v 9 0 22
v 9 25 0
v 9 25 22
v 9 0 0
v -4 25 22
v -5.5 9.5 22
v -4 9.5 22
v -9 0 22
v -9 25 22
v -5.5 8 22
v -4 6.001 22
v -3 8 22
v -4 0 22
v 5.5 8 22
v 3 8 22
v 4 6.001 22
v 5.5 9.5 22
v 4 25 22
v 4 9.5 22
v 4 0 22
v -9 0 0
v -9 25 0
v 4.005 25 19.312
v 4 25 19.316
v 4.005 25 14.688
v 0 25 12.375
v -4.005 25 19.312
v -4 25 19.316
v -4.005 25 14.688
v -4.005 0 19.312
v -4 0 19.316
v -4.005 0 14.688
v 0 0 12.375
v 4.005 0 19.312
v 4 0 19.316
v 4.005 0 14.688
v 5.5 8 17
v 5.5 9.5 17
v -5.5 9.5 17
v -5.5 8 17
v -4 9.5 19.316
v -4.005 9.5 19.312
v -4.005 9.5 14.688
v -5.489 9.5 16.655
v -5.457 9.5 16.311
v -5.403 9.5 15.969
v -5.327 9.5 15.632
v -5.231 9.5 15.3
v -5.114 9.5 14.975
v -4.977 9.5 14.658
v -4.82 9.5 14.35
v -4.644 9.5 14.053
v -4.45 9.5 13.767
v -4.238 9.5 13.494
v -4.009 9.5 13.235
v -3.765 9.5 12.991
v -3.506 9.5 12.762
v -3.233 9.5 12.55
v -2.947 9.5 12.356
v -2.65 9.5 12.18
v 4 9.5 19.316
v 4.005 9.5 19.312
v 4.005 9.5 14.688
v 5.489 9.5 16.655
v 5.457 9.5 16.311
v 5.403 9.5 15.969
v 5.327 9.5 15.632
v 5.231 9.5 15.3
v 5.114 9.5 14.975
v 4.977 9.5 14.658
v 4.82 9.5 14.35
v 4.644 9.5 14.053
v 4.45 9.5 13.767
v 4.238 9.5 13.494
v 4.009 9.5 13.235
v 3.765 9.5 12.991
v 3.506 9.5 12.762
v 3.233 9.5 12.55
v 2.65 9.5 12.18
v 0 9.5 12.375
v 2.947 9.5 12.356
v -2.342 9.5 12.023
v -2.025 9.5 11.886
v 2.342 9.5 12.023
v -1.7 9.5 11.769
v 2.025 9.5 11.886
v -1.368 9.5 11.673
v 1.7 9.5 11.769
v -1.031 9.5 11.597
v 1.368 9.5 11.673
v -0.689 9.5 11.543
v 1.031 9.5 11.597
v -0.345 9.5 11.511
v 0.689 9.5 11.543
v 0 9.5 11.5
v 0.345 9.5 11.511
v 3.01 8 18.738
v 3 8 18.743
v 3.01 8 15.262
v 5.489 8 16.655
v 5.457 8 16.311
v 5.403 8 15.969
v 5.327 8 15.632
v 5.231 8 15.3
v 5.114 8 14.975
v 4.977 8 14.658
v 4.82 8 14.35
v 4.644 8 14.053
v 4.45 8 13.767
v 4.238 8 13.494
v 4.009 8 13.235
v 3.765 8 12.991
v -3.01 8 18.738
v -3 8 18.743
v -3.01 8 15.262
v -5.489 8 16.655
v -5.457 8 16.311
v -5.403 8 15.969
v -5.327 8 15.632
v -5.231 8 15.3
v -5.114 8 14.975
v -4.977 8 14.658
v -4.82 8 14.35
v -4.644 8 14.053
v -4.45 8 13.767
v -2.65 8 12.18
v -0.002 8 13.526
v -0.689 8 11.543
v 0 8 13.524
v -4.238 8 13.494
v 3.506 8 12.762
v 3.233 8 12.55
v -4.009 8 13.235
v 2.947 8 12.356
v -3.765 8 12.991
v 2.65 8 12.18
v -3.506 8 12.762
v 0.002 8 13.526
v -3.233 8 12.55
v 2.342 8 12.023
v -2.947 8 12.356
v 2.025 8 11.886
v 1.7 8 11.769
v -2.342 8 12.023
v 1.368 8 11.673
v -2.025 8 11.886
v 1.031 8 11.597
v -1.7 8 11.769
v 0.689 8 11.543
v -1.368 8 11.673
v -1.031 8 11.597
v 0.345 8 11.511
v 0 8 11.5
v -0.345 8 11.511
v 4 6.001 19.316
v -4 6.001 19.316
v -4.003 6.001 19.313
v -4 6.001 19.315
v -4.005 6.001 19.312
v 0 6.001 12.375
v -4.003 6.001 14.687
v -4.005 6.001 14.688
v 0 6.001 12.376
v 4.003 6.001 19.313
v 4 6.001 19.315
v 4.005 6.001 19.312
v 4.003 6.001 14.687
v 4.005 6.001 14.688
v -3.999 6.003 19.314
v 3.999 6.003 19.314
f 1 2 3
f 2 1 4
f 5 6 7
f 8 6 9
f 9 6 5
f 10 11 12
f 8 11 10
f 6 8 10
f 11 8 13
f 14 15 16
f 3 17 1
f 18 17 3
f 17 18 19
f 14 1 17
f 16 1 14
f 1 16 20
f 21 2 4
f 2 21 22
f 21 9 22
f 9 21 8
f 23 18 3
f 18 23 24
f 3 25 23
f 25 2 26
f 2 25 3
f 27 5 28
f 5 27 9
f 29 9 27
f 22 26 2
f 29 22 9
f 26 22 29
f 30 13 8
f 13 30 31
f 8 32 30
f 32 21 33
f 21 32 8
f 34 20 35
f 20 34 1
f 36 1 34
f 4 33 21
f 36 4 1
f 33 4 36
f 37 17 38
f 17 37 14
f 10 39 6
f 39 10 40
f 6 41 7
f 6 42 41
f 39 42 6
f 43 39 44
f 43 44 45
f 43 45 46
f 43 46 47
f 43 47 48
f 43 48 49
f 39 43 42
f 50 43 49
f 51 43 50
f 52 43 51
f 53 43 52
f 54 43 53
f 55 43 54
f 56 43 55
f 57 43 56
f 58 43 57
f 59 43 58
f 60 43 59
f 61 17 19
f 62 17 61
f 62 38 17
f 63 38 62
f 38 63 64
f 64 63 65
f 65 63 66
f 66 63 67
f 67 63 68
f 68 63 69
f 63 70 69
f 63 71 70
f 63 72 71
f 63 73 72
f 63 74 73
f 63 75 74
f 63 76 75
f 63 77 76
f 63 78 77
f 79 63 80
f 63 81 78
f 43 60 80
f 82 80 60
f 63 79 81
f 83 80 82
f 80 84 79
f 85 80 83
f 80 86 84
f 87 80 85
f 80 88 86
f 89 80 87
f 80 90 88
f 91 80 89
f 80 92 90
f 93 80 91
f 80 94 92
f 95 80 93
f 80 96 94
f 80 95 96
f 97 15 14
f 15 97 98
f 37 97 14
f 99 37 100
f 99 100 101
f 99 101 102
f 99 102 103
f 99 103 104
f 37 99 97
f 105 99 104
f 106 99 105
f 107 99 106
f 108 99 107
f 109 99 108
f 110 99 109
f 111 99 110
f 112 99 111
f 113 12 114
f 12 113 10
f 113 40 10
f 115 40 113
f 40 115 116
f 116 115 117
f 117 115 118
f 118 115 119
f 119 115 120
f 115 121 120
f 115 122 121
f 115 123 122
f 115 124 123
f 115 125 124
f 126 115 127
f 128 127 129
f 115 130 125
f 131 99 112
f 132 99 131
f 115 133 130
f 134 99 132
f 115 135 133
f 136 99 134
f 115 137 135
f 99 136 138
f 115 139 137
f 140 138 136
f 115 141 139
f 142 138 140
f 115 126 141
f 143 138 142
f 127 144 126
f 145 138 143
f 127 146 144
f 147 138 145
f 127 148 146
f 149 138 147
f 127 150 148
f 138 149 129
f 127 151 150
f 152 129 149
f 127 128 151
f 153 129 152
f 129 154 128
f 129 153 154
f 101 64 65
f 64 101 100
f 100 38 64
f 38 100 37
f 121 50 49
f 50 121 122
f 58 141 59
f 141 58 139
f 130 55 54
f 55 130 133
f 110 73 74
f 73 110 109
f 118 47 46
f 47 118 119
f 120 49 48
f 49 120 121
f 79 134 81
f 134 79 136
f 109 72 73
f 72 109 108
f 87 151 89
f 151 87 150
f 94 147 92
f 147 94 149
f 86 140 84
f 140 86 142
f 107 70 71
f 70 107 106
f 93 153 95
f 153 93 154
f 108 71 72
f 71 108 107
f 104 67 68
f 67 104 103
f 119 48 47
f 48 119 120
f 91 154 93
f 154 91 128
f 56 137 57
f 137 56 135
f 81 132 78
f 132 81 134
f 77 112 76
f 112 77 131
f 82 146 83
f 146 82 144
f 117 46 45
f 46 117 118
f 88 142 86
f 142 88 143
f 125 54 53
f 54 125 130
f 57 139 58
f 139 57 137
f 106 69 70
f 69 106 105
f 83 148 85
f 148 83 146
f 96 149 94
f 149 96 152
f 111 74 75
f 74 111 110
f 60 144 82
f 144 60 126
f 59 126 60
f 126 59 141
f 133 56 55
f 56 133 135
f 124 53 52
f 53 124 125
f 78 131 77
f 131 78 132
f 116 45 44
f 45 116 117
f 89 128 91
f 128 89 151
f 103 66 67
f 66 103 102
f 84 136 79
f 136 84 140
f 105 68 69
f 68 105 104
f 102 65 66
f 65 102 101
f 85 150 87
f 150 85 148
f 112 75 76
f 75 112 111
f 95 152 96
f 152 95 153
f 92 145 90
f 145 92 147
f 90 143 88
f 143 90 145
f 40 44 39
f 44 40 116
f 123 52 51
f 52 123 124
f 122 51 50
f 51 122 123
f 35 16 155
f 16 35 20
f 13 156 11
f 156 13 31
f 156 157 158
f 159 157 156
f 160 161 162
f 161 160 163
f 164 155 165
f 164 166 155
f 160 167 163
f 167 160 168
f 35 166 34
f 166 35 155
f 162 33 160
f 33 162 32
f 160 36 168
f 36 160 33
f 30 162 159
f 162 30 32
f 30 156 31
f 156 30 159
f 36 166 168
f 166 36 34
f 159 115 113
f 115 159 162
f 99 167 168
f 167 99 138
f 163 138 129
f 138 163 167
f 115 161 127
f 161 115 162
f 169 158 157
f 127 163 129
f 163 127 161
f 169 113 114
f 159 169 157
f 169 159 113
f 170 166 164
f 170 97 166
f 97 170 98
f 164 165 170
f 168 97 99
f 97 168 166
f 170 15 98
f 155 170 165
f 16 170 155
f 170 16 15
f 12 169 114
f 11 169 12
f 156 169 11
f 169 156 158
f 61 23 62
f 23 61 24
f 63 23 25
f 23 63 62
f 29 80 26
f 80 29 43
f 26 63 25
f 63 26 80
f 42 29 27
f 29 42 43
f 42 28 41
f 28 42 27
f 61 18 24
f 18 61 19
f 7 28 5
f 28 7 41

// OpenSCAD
$fn=100;

screw_height=17;
module nut_holder()
{
    l=25;
    difference()
    {
        translate([-9,0,0])
            cube([18,l,screw_height + 5]);

        translate([-5.5,8,screw_height])
            cube([11,1.5,5.001]);
        translate([0,8,screw_height])
            rotate([-90,0,0])
                cylinder(d=11,h=1.5);

        translate([-4,-0.001,screw_height])
            cube([8,6.002,5.001]);
        translate([0,-0.001,screw_height])
            rotate([-90,30,0])
                cylinder(d=9.25,h=6.002,$fn=6);
        
        
        translate([0,6,screw_height])
            rotate([-90,30,0])
                cylinder(d1=9.25,d2=6.95,h=2.001,$fn=6);

        hull()
        {
            translate([-4,6,screw_height])
                cube([8,0.001,5.001]);
            translate([-3,8,screw_height])
                cube([6,0.001,5.001]);
        }
        
        
        
        translate([0,9.499,screw_height])
            rotate([-90,30,0])
                cylinder(d=9.25,h=l-9.498,$fn=6);        
        translate([-4,9.499,screw_height])
            cube([8,l-9.498,5.001]);



/*
        for(i=[-8.5,8.5])
            for(j=[4,l-4])
                translate([i,j,-0.001])
                    cylinder(d=3.5,h=screw_height + 5.002);
*/        
    }
}

nut_holder();
